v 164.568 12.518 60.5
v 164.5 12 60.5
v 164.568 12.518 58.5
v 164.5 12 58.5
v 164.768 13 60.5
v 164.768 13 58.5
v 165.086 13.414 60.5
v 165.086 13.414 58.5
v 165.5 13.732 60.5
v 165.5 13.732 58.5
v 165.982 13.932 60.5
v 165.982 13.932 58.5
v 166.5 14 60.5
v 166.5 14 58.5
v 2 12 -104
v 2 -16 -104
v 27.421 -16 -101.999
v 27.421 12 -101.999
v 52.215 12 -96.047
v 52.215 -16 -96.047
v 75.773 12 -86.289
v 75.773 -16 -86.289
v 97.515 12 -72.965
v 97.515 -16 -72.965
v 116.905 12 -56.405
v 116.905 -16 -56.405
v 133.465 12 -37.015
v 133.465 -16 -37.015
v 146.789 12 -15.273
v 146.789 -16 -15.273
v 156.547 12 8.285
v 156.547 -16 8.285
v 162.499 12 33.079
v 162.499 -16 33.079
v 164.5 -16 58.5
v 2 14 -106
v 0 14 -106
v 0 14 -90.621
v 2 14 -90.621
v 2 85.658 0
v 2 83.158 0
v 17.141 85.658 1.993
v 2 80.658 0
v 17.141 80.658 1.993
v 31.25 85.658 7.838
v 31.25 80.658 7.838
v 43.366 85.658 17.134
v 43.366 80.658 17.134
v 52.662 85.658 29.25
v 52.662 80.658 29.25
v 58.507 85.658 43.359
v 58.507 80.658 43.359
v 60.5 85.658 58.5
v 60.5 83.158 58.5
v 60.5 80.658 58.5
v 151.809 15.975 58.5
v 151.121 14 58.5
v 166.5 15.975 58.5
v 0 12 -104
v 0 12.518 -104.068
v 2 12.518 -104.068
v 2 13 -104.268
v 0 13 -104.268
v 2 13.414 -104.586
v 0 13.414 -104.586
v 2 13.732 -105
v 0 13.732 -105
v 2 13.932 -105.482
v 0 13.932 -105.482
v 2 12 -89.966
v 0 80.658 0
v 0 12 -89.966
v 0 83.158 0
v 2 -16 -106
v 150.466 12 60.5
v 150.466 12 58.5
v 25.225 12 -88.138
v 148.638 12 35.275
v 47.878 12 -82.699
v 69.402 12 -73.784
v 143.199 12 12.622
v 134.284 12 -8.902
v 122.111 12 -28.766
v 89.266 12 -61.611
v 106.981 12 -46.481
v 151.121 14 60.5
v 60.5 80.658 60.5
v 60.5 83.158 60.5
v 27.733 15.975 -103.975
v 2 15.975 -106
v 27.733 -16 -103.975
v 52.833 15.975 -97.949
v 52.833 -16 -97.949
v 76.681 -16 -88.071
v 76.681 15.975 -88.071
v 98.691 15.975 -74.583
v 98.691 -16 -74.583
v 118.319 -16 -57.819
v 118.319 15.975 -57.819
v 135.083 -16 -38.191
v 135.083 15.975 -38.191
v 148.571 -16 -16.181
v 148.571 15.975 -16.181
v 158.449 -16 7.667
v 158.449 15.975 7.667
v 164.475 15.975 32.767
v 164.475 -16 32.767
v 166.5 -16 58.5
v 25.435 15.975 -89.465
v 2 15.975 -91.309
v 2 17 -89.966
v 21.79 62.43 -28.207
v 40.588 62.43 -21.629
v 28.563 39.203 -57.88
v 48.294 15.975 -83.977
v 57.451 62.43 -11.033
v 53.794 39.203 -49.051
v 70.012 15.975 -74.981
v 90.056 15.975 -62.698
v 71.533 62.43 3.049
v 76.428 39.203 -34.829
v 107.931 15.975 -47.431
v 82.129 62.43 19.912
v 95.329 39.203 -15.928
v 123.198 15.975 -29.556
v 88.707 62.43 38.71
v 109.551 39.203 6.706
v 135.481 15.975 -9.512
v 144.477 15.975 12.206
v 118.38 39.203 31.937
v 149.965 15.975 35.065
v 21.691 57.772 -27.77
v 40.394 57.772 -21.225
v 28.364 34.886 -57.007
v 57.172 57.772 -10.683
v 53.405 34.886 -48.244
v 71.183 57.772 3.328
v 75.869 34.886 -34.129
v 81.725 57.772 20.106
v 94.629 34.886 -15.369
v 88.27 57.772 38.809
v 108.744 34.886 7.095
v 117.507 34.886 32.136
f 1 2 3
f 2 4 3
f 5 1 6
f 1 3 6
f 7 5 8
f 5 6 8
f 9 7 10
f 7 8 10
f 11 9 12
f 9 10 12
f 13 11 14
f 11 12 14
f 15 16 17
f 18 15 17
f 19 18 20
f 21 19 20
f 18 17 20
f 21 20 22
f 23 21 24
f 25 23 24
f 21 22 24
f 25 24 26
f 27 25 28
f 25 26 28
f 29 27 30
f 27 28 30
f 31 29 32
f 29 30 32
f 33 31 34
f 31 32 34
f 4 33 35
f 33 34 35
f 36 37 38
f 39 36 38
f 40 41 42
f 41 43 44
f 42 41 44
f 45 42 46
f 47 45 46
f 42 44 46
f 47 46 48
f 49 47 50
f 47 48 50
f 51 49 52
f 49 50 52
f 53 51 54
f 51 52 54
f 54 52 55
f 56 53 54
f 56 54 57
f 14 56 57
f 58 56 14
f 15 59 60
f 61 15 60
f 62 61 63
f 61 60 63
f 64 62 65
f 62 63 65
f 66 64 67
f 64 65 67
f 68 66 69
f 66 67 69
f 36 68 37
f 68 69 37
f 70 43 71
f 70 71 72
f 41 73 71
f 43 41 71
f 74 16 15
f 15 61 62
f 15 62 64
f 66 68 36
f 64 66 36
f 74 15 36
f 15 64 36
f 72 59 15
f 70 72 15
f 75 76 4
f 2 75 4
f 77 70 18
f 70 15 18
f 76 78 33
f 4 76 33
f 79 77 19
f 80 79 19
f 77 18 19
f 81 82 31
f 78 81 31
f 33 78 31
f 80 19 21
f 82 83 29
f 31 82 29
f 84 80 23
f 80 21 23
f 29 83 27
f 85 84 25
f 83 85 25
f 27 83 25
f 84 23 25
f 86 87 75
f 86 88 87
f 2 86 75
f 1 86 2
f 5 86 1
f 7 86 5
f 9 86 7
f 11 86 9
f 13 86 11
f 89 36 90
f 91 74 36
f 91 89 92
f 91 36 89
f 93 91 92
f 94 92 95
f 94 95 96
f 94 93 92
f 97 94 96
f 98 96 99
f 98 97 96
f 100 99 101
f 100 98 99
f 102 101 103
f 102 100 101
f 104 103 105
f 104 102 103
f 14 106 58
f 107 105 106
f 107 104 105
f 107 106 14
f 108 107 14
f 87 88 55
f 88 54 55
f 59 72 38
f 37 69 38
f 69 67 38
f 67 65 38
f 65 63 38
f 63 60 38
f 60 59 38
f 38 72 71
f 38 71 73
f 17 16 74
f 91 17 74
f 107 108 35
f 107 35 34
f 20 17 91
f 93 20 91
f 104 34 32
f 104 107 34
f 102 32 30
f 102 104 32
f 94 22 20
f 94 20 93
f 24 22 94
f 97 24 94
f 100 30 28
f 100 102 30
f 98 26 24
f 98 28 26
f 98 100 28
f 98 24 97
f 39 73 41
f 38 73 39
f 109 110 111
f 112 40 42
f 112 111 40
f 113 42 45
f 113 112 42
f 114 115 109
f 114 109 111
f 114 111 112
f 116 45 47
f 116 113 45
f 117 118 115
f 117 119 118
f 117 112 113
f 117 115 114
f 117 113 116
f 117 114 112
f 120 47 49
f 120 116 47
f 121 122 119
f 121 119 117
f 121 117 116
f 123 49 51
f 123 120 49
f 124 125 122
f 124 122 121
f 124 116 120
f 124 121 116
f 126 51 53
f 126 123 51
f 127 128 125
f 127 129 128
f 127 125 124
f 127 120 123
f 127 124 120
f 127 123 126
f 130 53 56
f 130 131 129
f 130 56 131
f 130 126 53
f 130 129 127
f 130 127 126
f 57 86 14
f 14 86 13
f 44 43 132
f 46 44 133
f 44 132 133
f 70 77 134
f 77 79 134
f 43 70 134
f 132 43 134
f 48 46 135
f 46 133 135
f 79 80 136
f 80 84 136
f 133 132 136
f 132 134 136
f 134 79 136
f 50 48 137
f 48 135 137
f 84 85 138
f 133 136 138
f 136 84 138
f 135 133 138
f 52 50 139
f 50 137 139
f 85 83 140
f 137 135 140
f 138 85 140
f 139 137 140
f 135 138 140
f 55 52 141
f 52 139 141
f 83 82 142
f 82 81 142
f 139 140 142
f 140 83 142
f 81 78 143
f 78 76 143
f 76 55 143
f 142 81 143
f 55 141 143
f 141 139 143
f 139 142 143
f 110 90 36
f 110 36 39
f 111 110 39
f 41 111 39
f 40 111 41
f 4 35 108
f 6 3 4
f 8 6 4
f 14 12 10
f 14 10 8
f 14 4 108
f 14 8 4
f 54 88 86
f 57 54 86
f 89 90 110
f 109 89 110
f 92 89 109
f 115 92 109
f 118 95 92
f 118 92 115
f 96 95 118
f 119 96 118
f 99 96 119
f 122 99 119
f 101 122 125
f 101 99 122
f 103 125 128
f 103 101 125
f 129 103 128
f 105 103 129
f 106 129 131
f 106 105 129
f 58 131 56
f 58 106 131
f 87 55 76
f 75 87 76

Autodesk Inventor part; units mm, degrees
ref_plane "YZ Plane" through (0, 0, 0) normal (1, 0, 0) x (0, 1, 0)
ref_plane "XZ Plane" through (0, 0, 0) normal (0, 1, 0) x (-1, 0, 0)
ref_plane "XY Plane" through (0, 0, 0) normal (0, 0, 1) x (1, 0, 0)
sketch "Sketch1" plane through (0, 0, 0) normal (1, 0, 0) x (0, 1, 0)
  line L0 (0, 0) -> (0, -104)
  line L1 (79.3684, 0) -> (0, -104)
  line L2 (79.3684, 0) -> (0, 0)
  line L3 (0, -104) -> (0, -104)
  line L4 (0, -104) -> (0, -106)
  line L5 (0, -106) -> (0, -106)
  line L6 (12, -88.2759) -> (12, -121.4374)
  line L7 (17, -106) -> (0, -106)
  line L8 (17, -104) -> (0, -104)
  line L9 (85.6581, 0) -> (17, -89.9658)
  line L10 (105.5294, 0) -> (79.3684, 0)
  line L11 (17, -89.9658) -> (17, -119.3457)
  circle A0 centre (12, -106) radius 2
  point P0 (12, -104)
  point P1 (14, -106)
  dimension "d5" = 79.3684
  dimension "d6" = 104
  dimension "d7" = 12
  dimension "d8" = 88.2759
  dimension "d9" = 0
  dimension "d11" = 2
  dimension "d12" = 5
  dimension "d13" = 5
extrude "Extrusion1" add sketch "Sketch1" along normal blind 2 contours L10 L9 L11 L8 L6 L1 | L8 L11 L7 A0
sketch "Sketch2" plane through (2, 0, 0) normal (1, 0, 0) x (0, 0, -1)
  line L0 (0, 85.6581) -> (0, 79.3684) projected
  line L1 (0, 80.6581) -> (89.9658, 12)
  line L2 (88.2759, 12) -> (104, 12) projected
  line L3 (0, 79.3684) -> (88.2759, 12) projected
  line L4 (102.4983, 12) -> (102.4983, 15.9748)
  line L5 (89.9658, 17) -> (0, 85.6581) projected
  line L6 (106, 14) -> (106, 17) projected
  line L7 (106, 15.9748) -> (91.3092, 15.9748)
  line L8 (0, 85.6581) -> (91.3092, 15.9748)
  line L9 (106, 15.9748) -> (106, 17)
  line L10 (106, 17) -> (89.9658, 17) projected
  line L11 (106, 15.9748) -> (106, 17)
  line L12 (106, 17) -> (89.9658, 17)
  point P0 (0, 0)
  dimension "d18" = 5
  dimension "d19" = 3.9748
  dimension "d20" = 3.9748
extrude "Extrusion2" cut sketch "Sketch2" against normal blind 2 contours L1 L2 L3 L0 | L10 L6 L7 L8
sketch "Sketch3" plane through (2, 0, 0) normal (1, 0, 0) x (0, 0, -1)
  line L0 (91.3092, 15.9748) -> (0, 85.6581) projected
  line L1 (0, 85.6581) -> (91.3092, 15.9748)
  line L2 (91.3092, 15.9748) -> (106, 15.9748) projected
  line L3 (91.3092, 15.9748) -> (106, 15.9748)
  arc A0 (106, 14) -> (104, 12) centre (106, 12) ccw projected
  line L4 (106, 15.9748) -> (106, 14)
  circle A1 centre (106, 12) radius 2
  line L5 (89.9658, 12) -> (104, 12) projected
  line L6 (89.9658, 12) -> (104, 12)
  line L7 (0, 85.6581) -> (0, 80.6581) projected
  line L8 (0, 85.6581) -> (0, 80.6581)
  line L9 (0, 80.6581) -> (89.9658, 12)
  line L10 (0, 83.1581) -> (-58.5, 83.1581)
  line L11 (0, 85.6581) -> (0, 80.6581) projected
  line L12 (-58.5, 83.1581) -> (-58.5, 115.0333)
  line L13 (106, 14) -> (104, 14)
  line L14 (104, 14) -> (104, -16)
  line L15 (104, -16) -> (106, -16)
  line L16 (106, -16) -> (106, 14)
  point P0 (0, 0)
  dimension "d21" = 58.5
  dimension "d32" = 30
revolve "Revolution1" add sketch "Sketch3" angle 90 about axis through (2, 83.1581, 58.5) along (0, -1, 0) contours L2 L4 L13 L14 L5 L9 L7 L0 | L16 A1 A0 | A0 L14 L13 | A1 L16 L15 L14
sketch "Sketch14" plane through (166.5, -16, 58.5) normal (0, 0, 1) x (1, 0, 0)
  line L0 (-14.6908, 31.9748) -> (-106, 101.6581) projected
  line L1 (-106, 96.6581) -> (-16.0342, 28) projected
  line L2 (-106, 101.6581) -> (-106, 96.6581)
  line L3 (-16.0342, 28) -> (-2, 28) projected
  line L4 (-106, 96.6581) -> (-16.0342, 28)
  point P0 (-166.5, 16)
sketch "Sketch4" plane through (60.5, 80.6581, 58.5) normal (0, 0, 1) x (1, 0, 0)
  line L0 (0, 5) -> (0, 0) projected
  line L1 (0, 5) -> (0, 0)
  line L2 (0, 0) -> (89.9658, -68.6581) projected
  line L3 (0, 0) -> (89.9658, -68.6581)
  line L4 (89.9658, -68.6581) -> (104, -68.6581) projected
  line L5 (89.9658, -68.6581) -> (104, -68.6581)
  line L6 (106, -66.6581) -> (106, -64.6834) projected
  line L7 (106, -66.6581) -> (106, -64.6834)
  line L8 (91.3092, -64.6834) -> (0, 5) projected
  line L9 (106, -64.6834) -> (91.3092, -64.6834)
  line L10 (91.3092, -64.6834) -> (0, 5)
  arc A0 (106, -66.6581) -> (104, -68.6581) centre (106, -68.6581) ccw projected
  circle A1 centre (106, -68.6581) radius 2
  point P0 (-60.5, -80.6581)
extrude "Extrusion3" add sketch "Sketch4" along normal blind 2 contours L8 L9 L6 A0 L4 L2 L0
sketch "Sketch5" plane through (60.5, 80.6581, 60.5) normal (0, 0, 1) x (1, 0, 0)
  line L0 (0, 5) -> (0, 0) projected
  line L1 (0, 2.5) -> (90.621, -66.6581)
  line L2 (-58.5, -66.6581) -> (106, -66.6581) projected
  line L3 (91.3092, -64.6834) -> (0, 5) projected
  line L4 (90.621, -66.6581) -> (106, -66.6581)
  line L5 (106, -66.6581) -> (106, -64.6834) projected
  line L6 (106, -64.6834) -> (91.3092, -64.6834) projected
  line L7 (106, -64.6834) -> (91.3092, -64.6834)
  line L8 (-58.5, 5) -> (0, 5) projected
  line L9 (91.3092, -64.6834) -> (0, 5)
  line L10 (0, 5) -> (0, 2.5)
  point P0 (-60.5, -80.6581)
extrude "Extrusion4" cut sketch "Sketch5" against normal blind 2
sketch "Sketch6" plane through (0, 0, 0) normal (-1, 0, 0) x (0, 0, 1)
  line L0 (0, 85.6581) -> (0, 80.6581) projected
  line L1 (0, 83.1581) -> (-90.621, 14)
  line L2 (-106, 14) -> (58.5, 14) projected
  line L3 (-91.3092, 15.9748) -> (0, 85.6581) projected
  line L4 (-106, 14) -> (-106, 15.9748) projected
  line L5 (-90.621, 14) -> (-106, 14)
  line L6 (-106, 14) -> (-106, 15.9748)
  line L7 (-106, 15.9748) -> (-91.3092, 15.9748)
  line L8 (0, 85.6581) -> (0, 83.1581)
  point P0 (0, 0)
extrude "Extrusion5" cut sketch "Sketch6" against normal blind 2
equation "\"d19\" = d20"
properties part number "Cover_v1"
